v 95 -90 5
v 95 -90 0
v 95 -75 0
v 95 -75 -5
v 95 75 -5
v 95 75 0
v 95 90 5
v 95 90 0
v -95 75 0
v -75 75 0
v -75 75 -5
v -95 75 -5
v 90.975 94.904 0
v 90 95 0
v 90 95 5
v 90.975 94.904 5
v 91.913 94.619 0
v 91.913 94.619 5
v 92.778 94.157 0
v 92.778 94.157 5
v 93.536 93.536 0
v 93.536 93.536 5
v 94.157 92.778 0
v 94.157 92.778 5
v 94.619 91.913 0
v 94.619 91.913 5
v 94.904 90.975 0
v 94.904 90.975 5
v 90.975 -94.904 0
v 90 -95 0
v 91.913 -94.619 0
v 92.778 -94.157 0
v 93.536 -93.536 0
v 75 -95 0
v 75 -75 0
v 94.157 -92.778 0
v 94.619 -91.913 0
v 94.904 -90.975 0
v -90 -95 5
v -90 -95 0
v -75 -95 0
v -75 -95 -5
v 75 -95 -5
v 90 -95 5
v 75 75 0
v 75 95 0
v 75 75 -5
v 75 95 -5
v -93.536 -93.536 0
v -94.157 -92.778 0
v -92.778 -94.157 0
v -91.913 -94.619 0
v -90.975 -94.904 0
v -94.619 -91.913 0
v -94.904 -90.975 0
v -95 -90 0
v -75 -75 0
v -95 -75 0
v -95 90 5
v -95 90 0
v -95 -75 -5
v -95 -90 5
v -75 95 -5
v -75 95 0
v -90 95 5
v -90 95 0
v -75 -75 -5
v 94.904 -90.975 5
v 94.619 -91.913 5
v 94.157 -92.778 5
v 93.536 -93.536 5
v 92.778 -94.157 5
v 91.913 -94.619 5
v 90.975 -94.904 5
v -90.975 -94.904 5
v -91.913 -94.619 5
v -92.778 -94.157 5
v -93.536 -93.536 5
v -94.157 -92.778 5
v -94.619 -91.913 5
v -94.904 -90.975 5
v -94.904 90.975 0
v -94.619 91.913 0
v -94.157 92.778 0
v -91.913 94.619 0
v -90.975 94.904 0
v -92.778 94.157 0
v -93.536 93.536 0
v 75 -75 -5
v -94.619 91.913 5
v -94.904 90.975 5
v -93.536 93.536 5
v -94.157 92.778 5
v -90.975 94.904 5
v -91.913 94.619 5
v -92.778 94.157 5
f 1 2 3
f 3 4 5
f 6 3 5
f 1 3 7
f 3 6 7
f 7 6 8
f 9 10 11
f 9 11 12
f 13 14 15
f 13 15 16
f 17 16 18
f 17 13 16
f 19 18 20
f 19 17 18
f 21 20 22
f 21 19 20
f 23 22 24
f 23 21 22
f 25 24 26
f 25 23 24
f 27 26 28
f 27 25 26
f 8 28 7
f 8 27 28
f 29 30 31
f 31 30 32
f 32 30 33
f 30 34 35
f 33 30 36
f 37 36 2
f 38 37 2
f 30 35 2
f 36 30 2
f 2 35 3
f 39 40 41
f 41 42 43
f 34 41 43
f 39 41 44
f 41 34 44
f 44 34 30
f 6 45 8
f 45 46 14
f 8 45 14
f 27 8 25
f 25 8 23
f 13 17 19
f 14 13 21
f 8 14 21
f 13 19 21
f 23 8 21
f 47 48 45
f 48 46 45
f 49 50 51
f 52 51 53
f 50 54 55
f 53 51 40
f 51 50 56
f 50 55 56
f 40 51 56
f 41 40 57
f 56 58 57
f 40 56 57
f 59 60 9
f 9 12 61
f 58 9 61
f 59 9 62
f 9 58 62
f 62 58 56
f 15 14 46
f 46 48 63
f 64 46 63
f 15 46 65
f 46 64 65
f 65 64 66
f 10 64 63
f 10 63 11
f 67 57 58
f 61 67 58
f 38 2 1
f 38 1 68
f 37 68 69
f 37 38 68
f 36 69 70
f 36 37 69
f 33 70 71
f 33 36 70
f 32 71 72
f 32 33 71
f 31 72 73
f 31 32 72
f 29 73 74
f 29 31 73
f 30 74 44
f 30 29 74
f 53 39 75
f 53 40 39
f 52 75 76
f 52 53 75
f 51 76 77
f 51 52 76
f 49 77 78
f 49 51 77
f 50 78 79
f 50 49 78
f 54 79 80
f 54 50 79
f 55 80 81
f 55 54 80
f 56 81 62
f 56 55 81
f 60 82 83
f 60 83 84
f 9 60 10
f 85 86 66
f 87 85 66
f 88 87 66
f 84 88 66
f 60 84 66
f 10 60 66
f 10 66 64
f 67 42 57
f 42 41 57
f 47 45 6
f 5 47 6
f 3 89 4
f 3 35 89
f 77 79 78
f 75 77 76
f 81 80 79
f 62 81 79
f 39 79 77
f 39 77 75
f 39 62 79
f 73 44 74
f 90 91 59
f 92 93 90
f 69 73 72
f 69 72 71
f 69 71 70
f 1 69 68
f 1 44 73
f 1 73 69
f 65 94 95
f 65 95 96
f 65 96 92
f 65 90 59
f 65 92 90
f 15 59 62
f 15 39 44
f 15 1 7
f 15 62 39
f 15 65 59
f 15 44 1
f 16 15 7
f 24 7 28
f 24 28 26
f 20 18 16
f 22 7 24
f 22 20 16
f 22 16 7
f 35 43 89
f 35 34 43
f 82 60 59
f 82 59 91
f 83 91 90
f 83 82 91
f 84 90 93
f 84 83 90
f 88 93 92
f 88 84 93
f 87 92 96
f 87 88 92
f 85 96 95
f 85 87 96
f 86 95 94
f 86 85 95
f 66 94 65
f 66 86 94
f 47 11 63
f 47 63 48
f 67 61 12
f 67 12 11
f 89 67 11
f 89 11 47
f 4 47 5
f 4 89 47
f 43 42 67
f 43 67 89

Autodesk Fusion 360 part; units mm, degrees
sketch "Sketch1" plane through (0, 0, 0) normal (0, 0, 1) x (1, 0, 0)
  line L0 (-25, 25) -> (25, 25)
  line L1 (25, 25) -> (25, -25)
  line L2 (25, -25) -> (-25, -25)
  line L3 (-25, -25) -> (-25, 25)
  dimension "d1" = 25
  dimension "d2" = 25
  dimension "d3" = 25
  dimension "d4" = 25
extrude "Extrude1" add sketch "Sketch1" along normal blind 1.6
equation "d2 = d1"
equation "d3 = d1"
equation "d4 = d1"

Autodesk Fusion 360 part; units mm, degrees
sketch "Sketch1" plane through (0, 0, 0) normal (0, 0, 1) x (1, 0, 0)
  line L0 (90, 95) -> (-90, 95)
  line L1 (-95, 90) -> (-95, -90)
  line L2 (-90, -95) -> (90, -95)
  line L3 (95, -90) -> (95, 90)
  arc A0 (95, 90) -> (90, 95) centre (90, 90) ccw
  arc A1 (-90, 95) -> (-95, 90) centre (-90, 90) ccw
  arc A2 (-95, -90) -> (-90, -95) centre (-90, -90) ccw
  arc A3 (90, -95) -> (95, -90) centre (90, -90) ccw
  point P0 (95, 95)
  point P1 (-95, 95)
  point P2 (95, -95)
  dimension "d1" = 190
  dimension "d2" = 190
  dimension "d3" = 95
  dimension "d4" = 95
  dimension "d5" = 5
extrude "Extrude1" add sketch "Sketch1" along normal blind 5
sketch "Sketch2" plane through (0, 0, 0) normal (0, 0, -1) x (1, 0, 0)
  arc A0 (95, 90) -> (90, 95) centre (90, 90) ccw
  line L0 (90, 95) -> (-90, 95)
  arc A1 (-90, 95) -> (-95, 90) centre (-90, 90) ccw
  line L1 (-95, 90) -> (-95, -90)
  arc A2 (-95, -90) -> (-90, -95) centre (-90, -90) ccw
  line L2 (-90, -95) -> (90, -95)
  arc A3 (90, -95) -> (95, -90) centre (90, -90) ccw
  line L3 (95, -90) -> (95, 90)
  line L4 (-95, 95) -> (95, 95)
  line L5 (95, 95) -> (95, -95)
  line L6 (95, -95) -> (-95, -95)
  line L7 (-95, -95) -> (-95, 95)
  line L8 (95, -95) -> (75, -95)
  line L9 (75, -95) -> (75, -75)
  line L10 (75, -75) -> (95, -75)
  line L11 (95, -75) -> (95, -95)
  line L12 (-95, -95) -> (-75, -95)
  line L13 (-75, -95) -> (-75, -75)
  line L14 (-75, -75) -> (-95, -75)
  line L15 (-95, -75) -> (-95, -95)
  line L16 (95, 95) -> (75, 95)
  line L17 (75, 95) -> (75, 75)
  line L18 (75, 75) -> (95, 75)
  line L19 (95, 75) -> (95, 95)
  line L20 (-95, 95) -> (-75, 95)
  line L21 (-75, 95) -> (-75, 75)
  line L22 (-75, 75) -> (-95, 75)
  line L23 (-95, 75) -> (-95, 95)
  dimension "d8" = 20
  dimension "d9" = 20
extrude "Extrude2" add sketch "Sketch2" along normal blind 5 contours L0 L1 L2 L3 L4 L5 L6 L7 L9 L10 L13 L14 L17 L18 L21 L22
equation "d2 = d1"
equation "d3 = d1 / 2"
equation "d4 = d1 / 2"
